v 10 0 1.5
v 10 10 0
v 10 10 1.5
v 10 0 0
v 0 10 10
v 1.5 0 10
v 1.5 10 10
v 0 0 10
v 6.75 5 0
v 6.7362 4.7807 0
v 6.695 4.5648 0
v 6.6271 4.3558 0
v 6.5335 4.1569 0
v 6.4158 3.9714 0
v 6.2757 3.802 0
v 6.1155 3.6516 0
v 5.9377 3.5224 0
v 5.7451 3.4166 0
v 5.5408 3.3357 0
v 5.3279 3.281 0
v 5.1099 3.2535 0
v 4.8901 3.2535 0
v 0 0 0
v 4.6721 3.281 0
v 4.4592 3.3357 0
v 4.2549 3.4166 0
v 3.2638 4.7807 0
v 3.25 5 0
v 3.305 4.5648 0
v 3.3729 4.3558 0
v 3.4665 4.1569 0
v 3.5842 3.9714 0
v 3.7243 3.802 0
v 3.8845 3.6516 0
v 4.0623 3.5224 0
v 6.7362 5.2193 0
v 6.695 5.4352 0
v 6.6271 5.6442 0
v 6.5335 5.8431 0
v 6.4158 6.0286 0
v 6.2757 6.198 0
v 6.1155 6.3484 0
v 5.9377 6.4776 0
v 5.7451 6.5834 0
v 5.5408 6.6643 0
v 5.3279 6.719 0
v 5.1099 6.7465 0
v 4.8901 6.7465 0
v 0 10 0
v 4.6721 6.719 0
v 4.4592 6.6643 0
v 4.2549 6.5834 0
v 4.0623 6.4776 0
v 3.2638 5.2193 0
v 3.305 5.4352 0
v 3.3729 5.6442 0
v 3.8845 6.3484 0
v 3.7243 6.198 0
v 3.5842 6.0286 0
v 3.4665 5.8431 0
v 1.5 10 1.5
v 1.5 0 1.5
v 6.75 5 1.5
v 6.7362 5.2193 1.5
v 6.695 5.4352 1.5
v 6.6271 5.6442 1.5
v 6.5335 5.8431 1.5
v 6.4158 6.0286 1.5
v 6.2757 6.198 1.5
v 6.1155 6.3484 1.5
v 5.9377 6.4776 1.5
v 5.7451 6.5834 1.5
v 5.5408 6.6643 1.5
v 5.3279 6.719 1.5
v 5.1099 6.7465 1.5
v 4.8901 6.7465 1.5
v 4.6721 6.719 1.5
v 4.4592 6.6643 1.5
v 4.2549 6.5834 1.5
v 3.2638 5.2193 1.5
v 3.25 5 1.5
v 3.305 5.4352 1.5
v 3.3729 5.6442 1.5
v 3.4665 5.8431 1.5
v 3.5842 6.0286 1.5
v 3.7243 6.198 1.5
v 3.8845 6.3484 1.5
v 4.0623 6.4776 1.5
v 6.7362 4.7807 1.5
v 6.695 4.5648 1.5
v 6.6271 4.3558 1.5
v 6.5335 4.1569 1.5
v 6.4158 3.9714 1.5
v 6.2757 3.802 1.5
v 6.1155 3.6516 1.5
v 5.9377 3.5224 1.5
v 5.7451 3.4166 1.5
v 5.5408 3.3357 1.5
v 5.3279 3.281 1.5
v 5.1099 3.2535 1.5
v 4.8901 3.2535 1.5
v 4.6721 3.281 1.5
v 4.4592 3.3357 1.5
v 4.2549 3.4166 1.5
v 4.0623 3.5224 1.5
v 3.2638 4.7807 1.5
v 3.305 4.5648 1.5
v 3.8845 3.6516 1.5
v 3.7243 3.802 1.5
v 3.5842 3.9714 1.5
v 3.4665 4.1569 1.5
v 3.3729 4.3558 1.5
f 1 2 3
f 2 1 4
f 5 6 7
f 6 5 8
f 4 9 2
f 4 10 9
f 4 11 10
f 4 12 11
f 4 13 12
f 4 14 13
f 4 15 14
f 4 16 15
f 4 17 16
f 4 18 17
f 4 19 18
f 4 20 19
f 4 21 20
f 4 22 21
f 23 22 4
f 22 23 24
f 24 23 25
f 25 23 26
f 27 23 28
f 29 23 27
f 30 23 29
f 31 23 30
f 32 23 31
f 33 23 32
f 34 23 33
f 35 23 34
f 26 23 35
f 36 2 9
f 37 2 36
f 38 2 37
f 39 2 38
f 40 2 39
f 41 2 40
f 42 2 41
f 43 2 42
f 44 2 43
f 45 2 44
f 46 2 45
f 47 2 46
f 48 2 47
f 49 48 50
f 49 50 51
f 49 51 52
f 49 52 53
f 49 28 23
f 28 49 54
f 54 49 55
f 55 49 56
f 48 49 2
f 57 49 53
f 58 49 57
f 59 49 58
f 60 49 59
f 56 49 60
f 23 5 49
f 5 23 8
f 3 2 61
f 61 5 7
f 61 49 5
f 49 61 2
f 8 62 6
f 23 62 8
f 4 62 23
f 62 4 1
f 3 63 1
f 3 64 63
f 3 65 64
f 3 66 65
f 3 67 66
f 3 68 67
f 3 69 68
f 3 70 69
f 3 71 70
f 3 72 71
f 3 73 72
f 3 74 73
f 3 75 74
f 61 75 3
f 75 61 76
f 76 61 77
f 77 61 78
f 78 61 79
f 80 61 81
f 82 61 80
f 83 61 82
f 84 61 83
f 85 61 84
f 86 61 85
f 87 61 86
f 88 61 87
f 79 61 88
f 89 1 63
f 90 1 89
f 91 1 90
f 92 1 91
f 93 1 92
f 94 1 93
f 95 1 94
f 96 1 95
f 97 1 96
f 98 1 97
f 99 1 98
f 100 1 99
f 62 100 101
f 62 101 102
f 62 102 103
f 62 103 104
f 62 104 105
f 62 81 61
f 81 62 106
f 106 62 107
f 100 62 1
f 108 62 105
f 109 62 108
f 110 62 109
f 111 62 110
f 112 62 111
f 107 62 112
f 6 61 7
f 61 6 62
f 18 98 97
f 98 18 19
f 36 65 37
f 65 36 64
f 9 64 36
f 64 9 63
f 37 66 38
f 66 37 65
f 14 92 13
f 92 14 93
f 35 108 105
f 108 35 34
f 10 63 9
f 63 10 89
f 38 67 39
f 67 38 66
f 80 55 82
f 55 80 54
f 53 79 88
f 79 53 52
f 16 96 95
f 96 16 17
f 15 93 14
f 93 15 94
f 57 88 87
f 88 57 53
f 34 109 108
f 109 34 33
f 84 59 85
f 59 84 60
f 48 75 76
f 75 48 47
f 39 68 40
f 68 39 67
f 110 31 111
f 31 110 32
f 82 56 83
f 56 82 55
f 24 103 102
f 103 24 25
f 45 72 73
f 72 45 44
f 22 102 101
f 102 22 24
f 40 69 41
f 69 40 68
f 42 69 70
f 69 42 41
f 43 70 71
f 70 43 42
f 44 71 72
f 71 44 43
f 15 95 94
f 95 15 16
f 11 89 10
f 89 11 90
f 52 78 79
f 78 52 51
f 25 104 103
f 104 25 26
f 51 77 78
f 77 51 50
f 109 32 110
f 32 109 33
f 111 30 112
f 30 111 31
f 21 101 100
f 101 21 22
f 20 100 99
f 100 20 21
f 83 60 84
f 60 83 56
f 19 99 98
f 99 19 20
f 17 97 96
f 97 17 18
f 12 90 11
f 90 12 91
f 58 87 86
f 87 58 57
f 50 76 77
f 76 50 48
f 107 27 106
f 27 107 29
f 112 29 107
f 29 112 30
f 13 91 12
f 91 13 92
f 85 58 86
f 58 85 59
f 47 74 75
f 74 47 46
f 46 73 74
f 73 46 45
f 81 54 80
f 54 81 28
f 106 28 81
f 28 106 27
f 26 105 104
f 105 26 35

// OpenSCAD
// Resolution
$fn=50;

// Properties
wall_thickness = 1.5 ;
rail_size = 10;
bracket_length = 10;
m3_clear = 3.5/2;

difference(){
    // Bracket
    cube([rail_size, bracket_length, rail_size]);
    
    // Cutout
    translate([wall_thickness,0,wall_thickness])
    cube([rail_size-wall_thickness, bracket_length, rail_size-wall_thickness]);
    
    // Screw holes
    translate([rail_size/2, rail_size/2, 0])
    cylinder(h=wall_thickness, r1=m3_clear, r2=m3_clear);
}
